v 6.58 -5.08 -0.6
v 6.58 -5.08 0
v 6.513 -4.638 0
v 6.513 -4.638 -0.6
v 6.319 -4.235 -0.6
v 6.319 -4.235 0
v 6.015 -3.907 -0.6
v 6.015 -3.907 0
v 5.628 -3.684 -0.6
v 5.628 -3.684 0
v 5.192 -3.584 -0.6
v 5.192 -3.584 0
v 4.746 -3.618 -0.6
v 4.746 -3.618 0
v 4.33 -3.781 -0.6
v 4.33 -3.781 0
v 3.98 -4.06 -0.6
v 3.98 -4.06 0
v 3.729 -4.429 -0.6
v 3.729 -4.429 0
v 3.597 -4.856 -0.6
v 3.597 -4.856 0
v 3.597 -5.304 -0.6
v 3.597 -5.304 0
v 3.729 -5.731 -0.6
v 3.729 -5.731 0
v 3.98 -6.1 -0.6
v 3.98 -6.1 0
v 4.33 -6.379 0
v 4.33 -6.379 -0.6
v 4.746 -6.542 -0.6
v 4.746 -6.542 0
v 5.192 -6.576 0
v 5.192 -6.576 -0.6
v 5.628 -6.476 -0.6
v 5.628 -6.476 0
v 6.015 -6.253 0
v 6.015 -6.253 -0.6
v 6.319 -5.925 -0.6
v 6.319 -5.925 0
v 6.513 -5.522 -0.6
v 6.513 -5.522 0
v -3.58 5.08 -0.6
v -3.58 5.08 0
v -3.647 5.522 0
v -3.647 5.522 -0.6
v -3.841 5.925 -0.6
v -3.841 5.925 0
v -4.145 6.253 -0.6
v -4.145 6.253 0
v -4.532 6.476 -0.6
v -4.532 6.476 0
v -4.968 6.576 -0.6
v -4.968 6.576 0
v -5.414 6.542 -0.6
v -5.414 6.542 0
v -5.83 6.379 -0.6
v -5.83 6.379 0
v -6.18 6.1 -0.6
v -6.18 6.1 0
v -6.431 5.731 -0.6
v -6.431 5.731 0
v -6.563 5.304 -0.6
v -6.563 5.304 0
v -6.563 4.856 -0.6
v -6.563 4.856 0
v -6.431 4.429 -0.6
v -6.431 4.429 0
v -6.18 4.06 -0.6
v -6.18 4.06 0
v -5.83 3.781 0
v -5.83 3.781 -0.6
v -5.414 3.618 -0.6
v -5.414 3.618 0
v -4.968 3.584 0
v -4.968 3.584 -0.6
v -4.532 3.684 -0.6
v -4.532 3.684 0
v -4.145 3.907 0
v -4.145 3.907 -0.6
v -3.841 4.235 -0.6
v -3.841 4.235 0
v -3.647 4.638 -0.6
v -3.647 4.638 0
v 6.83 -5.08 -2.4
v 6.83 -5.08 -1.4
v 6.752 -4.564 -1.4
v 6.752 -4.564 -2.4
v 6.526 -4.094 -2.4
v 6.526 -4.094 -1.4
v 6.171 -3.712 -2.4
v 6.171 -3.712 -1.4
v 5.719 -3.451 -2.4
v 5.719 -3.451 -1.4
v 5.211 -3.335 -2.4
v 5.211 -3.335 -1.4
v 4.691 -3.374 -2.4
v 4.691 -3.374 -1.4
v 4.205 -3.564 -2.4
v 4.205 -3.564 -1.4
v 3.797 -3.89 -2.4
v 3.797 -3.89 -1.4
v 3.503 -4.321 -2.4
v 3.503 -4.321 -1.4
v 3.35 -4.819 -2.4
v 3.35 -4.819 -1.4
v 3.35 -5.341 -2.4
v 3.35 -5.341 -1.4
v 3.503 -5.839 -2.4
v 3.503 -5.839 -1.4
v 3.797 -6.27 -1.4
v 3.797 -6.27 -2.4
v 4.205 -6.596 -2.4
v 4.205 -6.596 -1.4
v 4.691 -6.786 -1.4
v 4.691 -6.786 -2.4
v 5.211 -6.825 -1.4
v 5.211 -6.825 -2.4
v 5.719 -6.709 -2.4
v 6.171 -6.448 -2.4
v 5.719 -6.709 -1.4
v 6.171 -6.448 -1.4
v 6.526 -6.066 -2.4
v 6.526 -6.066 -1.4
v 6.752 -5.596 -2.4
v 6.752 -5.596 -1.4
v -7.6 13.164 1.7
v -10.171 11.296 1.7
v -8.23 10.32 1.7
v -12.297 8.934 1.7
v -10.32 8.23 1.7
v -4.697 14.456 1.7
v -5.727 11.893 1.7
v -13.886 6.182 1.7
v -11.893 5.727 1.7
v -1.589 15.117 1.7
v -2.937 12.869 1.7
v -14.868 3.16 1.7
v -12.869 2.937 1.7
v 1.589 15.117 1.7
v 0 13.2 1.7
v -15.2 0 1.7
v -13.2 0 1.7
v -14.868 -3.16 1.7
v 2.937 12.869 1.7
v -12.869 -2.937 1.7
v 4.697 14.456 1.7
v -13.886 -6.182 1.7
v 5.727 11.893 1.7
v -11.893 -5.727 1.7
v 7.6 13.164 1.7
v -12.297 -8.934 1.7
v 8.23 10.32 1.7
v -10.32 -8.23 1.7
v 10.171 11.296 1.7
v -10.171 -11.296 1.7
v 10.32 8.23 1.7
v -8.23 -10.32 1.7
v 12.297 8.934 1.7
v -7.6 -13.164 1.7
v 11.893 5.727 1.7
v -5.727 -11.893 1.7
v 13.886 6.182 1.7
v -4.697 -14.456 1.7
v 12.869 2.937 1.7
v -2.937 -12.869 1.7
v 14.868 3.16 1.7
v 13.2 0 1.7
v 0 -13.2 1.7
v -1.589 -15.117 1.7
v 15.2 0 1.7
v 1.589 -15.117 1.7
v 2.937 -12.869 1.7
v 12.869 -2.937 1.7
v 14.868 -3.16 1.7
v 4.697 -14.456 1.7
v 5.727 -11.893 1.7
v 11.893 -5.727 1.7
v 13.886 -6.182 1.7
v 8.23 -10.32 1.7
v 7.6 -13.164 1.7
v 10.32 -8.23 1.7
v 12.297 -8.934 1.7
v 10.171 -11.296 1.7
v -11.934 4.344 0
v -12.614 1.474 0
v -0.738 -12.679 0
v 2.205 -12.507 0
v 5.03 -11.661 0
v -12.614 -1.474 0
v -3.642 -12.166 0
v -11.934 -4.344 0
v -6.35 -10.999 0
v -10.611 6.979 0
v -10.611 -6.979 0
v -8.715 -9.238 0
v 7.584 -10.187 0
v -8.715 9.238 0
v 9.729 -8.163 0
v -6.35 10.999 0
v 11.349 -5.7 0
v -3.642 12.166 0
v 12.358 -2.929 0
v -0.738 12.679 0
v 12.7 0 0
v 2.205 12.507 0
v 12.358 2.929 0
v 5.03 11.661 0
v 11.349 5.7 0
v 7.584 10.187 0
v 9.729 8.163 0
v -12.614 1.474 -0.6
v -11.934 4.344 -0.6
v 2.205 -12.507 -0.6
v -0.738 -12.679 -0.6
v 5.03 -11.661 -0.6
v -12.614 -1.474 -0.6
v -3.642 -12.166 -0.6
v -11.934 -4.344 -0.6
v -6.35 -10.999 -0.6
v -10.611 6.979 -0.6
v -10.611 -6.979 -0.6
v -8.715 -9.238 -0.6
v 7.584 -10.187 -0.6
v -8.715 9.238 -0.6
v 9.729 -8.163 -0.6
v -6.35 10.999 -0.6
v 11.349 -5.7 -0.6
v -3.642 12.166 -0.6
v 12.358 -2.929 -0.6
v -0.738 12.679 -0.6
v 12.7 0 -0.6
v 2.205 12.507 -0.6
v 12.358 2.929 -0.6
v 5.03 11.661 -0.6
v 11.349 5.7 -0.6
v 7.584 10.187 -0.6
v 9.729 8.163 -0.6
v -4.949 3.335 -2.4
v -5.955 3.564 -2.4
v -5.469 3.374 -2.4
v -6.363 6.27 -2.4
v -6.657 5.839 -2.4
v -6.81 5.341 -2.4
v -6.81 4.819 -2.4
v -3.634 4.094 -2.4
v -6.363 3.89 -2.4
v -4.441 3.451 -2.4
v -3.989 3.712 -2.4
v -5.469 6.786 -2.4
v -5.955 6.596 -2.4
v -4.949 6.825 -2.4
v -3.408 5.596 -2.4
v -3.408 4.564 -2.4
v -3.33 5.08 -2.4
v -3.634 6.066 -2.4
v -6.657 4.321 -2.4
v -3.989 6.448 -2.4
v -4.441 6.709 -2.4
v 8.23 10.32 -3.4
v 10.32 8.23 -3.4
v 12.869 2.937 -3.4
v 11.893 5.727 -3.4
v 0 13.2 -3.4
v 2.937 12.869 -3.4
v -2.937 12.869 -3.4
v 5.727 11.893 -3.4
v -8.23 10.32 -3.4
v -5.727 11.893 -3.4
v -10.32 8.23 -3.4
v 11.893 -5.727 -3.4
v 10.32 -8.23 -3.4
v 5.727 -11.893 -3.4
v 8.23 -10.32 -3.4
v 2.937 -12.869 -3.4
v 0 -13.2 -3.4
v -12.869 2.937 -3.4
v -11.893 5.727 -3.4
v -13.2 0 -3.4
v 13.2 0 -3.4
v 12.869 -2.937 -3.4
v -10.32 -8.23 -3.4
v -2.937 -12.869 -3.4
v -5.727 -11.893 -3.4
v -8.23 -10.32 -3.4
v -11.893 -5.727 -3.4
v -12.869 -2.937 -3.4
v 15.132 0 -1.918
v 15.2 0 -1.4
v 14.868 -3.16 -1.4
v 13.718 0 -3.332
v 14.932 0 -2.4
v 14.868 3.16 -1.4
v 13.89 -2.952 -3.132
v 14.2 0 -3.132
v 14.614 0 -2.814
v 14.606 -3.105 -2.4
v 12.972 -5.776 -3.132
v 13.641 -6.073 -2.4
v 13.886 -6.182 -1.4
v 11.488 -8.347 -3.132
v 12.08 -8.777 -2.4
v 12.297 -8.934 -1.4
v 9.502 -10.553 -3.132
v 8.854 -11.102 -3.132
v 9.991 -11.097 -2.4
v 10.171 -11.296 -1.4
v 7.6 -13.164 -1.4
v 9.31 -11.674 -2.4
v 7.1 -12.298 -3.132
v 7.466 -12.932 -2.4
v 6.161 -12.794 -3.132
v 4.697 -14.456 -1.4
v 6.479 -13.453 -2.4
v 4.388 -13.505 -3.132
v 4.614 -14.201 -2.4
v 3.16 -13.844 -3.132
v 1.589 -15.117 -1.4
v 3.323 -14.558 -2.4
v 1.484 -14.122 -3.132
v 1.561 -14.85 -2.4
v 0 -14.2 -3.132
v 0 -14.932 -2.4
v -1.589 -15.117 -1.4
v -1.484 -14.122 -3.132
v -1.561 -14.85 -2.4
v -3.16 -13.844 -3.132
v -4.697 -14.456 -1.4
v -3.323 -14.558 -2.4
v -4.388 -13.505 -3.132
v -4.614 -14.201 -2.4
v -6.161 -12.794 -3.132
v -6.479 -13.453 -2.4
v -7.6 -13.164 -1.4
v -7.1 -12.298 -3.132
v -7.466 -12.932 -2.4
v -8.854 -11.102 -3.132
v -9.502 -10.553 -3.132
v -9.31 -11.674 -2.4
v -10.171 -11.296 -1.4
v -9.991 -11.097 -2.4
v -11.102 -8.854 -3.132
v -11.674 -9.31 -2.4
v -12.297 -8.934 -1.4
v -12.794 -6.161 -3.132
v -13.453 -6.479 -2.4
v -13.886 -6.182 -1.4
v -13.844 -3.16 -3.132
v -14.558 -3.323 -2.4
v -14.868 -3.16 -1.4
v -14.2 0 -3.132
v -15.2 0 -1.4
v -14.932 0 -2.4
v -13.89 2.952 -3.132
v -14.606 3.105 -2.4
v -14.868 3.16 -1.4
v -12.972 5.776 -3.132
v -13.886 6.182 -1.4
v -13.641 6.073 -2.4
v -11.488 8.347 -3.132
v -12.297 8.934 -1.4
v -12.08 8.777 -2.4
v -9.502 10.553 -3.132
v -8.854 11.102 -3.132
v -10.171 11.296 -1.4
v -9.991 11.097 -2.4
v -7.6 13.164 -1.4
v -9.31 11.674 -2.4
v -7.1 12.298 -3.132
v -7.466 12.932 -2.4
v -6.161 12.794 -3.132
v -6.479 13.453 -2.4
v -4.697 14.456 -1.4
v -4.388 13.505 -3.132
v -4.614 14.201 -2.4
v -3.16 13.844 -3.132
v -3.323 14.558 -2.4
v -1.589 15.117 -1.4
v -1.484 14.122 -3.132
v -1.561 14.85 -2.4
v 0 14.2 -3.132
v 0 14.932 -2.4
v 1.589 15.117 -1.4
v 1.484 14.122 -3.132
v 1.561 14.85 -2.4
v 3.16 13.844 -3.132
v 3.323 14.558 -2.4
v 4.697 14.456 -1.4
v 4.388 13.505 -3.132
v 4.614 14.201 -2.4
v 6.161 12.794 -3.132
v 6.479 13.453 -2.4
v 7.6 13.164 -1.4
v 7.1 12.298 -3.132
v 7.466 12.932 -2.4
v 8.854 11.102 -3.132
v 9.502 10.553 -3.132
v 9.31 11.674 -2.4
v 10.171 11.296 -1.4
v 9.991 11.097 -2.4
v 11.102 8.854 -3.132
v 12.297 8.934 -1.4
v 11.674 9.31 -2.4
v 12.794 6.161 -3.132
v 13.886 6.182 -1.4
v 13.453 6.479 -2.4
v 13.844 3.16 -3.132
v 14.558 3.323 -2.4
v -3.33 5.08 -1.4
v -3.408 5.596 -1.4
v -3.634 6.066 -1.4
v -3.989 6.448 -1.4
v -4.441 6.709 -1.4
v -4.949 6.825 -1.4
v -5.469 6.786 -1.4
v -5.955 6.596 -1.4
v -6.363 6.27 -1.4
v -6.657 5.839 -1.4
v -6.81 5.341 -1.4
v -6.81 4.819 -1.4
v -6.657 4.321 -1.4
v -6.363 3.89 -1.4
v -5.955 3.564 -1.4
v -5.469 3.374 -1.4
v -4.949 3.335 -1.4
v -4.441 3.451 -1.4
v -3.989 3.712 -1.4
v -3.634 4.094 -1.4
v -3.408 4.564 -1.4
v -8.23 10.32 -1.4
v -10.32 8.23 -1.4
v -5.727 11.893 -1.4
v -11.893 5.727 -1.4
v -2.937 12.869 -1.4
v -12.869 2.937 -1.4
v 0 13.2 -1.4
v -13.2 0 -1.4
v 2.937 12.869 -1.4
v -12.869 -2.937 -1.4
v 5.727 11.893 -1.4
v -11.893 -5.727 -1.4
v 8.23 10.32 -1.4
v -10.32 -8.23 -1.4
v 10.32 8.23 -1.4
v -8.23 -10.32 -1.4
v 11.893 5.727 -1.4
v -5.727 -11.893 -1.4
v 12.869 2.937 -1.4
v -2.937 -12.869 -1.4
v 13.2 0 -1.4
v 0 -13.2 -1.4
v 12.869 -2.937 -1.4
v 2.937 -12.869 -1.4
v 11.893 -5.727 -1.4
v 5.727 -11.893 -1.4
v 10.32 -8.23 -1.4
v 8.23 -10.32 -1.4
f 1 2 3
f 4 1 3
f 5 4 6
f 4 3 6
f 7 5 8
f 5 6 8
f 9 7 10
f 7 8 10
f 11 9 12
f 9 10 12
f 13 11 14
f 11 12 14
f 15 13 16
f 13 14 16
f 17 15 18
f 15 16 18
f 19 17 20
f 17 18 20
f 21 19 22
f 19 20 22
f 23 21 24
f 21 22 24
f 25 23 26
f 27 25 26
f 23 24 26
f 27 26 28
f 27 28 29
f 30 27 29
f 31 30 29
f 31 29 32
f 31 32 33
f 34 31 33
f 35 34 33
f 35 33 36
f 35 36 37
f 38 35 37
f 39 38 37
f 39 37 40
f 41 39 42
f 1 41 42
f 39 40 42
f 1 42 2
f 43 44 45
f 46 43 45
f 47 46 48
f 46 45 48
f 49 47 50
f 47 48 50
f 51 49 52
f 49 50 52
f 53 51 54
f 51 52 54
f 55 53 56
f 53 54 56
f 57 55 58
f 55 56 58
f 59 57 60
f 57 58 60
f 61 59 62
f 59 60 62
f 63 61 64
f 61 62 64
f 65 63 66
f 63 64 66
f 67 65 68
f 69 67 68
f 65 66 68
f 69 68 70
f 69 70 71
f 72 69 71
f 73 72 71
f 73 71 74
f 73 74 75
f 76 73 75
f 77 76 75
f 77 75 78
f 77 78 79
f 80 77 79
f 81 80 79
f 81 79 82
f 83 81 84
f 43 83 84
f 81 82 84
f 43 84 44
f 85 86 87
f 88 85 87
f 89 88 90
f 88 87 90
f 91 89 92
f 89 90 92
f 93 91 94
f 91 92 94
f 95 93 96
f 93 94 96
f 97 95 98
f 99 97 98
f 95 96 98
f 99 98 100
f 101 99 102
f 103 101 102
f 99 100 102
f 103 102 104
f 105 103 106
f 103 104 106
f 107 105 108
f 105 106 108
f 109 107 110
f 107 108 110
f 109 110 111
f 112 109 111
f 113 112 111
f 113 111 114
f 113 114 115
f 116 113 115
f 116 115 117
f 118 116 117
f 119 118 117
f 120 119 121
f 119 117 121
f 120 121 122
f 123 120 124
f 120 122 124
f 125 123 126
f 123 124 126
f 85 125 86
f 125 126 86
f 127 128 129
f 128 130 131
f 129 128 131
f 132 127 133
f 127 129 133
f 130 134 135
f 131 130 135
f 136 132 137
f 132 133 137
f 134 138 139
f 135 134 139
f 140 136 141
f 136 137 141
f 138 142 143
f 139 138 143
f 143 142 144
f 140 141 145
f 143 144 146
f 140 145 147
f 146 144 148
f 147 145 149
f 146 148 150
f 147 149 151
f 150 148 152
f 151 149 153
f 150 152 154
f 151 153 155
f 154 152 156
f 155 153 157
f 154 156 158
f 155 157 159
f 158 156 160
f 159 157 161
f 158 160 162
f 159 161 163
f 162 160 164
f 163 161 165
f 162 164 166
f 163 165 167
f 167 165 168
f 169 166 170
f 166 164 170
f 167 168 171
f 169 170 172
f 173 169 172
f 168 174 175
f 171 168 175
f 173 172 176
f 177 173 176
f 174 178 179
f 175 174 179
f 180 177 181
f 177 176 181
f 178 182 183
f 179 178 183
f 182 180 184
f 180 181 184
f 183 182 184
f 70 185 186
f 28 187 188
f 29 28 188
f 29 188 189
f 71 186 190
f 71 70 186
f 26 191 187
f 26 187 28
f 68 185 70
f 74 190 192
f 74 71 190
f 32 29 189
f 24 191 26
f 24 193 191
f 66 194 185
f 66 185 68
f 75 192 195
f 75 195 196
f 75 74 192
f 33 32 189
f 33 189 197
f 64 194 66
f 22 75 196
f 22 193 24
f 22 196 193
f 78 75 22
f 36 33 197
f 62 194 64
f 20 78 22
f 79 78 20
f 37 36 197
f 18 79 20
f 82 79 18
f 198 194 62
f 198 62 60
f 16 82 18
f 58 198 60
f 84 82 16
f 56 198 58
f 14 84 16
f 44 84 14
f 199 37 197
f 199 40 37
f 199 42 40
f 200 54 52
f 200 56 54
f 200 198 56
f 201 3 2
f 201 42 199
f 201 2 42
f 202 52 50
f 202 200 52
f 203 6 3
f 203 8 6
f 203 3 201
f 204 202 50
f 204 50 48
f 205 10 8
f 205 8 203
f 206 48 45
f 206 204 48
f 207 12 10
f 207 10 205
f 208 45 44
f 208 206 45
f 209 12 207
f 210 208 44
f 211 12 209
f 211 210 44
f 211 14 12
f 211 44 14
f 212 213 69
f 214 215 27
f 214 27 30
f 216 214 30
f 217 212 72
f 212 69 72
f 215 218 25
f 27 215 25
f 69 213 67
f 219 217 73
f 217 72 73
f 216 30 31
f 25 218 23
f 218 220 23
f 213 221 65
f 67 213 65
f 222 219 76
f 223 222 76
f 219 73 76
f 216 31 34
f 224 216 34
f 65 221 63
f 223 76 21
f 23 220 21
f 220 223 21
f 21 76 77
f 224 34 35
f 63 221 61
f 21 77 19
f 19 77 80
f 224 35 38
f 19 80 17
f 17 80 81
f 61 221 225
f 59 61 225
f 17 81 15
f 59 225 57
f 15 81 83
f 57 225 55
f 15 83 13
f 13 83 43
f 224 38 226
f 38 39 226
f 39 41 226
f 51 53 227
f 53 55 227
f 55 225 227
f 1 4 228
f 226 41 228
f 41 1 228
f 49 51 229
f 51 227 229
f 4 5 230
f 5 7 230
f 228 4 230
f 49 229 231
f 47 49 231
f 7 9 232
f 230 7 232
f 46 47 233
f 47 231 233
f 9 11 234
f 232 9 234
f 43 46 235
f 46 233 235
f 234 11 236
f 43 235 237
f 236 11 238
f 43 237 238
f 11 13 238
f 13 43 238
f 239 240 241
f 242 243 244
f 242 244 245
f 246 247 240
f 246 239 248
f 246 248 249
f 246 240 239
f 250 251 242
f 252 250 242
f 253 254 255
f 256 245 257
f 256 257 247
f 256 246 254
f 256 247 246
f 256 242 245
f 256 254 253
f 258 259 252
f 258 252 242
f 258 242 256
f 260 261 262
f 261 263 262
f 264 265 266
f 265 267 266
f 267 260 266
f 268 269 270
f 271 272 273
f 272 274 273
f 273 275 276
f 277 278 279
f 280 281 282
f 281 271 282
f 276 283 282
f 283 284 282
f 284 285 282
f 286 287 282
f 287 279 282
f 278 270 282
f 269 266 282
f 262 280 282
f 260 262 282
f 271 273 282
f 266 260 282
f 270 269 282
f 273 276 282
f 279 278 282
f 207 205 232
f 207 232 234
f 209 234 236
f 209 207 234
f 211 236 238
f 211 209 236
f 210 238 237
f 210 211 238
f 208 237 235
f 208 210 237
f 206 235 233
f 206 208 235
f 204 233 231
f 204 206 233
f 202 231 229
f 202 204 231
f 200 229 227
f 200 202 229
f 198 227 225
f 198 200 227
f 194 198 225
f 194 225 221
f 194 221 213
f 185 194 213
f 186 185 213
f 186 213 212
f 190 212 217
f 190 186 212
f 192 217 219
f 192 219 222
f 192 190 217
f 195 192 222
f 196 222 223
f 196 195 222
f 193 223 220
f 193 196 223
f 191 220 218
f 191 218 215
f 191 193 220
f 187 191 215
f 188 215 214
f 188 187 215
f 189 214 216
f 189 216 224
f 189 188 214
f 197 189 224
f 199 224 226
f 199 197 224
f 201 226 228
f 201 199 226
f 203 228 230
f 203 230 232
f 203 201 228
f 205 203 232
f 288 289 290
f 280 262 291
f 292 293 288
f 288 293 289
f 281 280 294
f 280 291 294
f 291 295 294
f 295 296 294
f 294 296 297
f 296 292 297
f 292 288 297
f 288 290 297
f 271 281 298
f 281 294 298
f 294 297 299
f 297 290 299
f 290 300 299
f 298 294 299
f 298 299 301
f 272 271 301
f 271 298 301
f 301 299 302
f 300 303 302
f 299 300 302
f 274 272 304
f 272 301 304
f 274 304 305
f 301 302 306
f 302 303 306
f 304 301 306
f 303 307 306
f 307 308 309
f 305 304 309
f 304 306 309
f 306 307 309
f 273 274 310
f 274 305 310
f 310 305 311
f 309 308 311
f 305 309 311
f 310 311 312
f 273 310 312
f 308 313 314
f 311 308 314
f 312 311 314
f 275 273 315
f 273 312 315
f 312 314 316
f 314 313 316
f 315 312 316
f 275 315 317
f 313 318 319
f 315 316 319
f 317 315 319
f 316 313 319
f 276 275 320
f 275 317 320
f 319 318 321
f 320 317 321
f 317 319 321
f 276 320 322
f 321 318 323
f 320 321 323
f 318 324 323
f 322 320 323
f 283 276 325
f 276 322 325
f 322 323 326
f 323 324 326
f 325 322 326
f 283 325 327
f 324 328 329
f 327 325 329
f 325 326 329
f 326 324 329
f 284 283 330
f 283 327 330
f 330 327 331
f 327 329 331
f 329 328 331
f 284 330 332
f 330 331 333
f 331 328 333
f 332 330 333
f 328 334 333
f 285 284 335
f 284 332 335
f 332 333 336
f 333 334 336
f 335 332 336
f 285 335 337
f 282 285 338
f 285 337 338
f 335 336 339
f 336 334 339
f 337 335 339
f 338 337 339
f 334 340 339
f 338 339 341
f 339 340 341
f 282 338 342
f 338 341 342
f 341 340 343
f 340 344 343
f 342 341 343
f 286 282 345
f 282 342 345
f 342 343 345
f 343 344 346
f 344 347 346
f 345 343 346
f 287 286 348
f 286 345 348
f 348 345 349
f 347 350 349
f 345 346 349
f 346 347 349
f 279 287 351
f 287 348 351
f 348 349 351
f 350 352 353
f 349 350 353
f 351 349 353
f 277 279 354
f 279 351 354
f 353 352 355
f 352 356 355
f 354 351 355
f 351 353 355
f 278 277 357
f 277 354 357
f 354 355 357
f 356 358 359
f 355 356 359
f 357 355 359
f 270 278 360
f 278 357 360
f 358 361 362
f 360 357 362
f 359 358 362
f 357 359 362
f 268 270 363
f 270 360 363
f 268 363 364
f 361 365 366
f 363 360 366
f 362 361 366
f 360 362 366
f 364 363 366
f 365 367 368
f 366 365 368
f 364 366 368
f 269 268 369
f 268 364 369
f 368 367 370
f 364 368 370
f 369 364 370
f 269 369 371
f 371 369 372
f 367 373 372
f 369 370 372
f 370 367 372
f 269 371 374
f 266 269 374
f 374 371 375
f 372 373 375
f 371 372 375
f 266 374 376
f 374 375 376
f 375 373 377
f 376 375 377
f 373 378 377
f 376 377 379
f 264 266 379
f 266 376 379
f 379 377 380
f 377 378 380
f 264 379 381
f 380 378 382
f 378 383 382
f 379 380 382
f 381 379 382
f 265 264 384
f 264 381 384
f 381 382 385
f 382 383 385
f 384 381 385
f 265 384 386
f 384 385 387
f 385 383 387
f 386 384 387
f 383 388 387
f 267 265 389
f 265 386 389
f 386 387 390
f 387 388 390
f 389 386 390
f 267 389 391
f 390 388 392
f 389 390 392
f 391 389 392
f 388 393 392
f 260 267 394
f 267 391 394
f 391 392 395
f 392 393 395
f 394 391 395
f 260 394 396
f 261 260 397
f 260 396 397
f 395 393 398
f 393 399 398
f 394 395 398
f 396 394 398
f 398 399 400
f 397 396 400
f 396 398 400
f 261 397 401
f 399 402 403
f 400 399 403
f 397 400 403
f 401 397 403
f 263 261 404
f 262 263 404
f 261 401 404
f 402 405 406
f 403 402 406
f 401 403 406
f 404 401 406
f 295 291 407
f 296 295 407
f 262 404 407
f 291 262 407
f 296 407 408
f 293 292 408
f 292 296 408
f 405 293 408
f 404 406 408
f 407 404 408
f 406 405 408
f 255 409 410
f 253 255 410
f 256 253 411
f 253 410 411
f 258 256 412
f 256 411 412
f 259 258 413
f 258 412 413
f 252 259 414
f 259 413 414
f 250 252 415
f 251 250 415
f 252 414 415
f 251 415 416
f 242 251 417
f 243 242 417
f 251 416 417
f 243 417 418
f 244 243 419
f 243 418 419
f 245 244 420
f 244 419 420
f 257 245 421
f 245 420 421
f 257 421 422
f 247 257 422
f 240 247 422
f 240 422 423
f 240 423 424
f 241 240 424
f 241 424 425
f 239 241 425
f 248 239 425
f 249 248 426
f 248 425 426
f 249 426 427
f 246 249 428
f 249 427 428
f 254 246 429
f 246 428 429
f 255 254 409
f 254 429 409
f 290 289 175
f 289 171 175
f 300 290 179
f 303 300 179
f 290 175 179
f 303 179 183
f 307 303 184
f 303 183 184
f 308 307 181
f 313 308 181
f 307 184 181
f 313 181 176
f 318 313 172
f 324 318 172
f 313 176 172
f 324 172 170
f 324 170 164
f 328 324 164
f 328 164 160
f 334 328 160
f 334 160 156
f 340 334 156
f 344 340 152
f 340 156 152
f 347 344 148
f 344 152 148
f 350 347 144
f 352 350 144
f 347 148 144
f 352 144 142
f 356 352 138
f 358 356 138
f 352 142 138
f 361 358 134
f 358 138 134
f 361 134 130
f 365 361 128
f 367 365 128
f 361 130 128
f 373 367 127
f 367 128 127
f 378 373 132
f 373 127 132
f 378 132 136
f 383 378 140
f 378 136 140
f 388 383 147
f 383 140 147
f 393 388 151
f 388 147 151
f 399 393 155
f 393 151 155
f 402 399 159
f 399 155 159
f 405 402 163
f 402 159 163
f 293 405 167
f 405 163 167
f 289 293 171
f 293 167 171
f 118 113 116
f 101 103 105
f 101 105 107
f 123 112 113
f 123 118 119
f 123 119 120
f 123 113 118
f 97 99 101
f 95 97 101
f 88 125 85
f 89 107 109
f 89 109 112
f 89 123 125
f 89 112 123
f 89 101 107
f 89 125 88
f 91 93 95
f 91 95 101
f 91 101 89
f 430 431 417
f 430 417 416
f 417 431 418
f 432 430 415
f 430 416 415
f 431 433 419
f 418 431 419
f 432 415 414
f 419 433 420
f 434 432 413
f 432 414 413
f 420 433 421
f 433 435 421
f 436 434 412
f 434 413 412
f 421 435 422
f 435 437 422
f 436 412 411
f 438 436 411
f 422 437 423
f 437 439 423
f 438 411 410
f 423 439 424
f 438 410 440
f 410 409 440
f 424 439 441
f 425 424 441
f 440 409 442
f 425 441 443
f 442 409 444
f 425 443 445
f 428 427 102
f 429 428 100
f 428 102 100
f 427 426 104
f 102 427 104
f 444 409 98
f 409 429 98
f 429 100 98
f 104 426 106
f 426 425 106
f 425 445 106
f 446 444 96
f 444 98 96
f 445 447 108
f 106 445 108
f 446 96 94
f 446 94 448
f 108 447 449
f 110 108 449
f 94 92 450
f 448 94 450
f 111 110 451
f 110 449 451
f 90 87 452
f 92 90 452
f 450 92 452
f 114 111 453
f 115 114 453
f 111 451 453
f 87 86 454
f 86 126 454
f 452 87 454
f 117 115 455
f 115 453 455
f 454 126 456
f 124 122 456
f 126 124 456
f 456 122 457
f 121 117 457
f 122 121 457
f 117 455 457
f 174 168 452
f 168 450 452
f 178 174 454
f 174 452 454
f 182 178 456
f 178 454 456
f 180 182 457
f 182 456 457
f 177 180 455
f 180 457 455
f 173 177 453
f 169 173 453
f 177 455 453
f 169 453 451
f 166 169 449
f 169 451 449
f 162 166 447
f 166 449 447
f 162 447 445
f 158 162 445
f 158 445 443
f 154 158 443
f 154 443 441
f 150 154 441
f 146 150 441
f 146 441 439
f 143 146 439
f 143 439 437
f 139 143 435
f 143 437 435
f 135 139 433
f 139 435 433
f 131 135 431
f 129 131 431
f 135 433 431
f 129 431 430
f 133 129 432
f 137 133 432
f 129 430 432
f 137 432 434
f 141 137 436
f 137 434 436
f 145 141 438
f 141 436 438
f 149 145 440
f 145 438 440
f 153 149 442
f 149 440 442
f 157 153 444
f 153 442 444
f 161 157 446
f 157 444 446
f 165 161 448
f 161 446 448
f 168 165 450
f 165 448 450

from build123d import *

# Parameters (mm, degrees)
F1_R     = 12.7
F1_R_2   = 1.5
F2_DEPTH = 0.6
F5_R     = 1.75
F6_DEPTH = 1


with BuildPart() as f2:
    # F1 (on Top) → F2 (new body)
    with BuildSketch(Plane.XY):
        Circle(F1_R)
        with Locations((5.08, -5.08)):
            Circle(F1_R_2, mode=Mode.SUBTRACT)
        with Locations((-5.08, 5.08)):
            Circle(F1_R_2, mode=Mode.SUBTRACT)
    extrude(amount=-F2_DEPTH)


with BuildPart() as f4:
    # F3 (on Front) → F4 (revolve)
    with BuildSketch(Plane.XZ):
        with BuildLine():
            Line((13.2, -1.4), (0, -1.4))
            Line((0, -1.4), (0, -3.4))
            Line((0, -3.4), (13.2, -3.4))
            ThreePointArc((13.2, -3.4), (14.614214, -2.814214), (15.2, -1.4))
            Line((15.2, -1.4), (15.2, 1.7))
            Line((15.2, 1.7), (13.2, 1.7))
            Line((13.2, 1.7), (13.2, -1.4))
        make_face()
    revolve(axis=Axis((0, 0, -2.4), (0, 0, -1)))

    # F5 (on face) → F6 (cut)
    with BuildSketch(Plane.XY.offset(-1.4)):
        with Locations((-5.08, 5.08)):
            Circle(F5_R)
        with Locations((5.08, -5.08)):
            Circle(F5_R)
    extrude(amount=-F6_DEPTH, mode=Mode.SUBTRACT)


solid = Compound([f2.part, f4.part])
